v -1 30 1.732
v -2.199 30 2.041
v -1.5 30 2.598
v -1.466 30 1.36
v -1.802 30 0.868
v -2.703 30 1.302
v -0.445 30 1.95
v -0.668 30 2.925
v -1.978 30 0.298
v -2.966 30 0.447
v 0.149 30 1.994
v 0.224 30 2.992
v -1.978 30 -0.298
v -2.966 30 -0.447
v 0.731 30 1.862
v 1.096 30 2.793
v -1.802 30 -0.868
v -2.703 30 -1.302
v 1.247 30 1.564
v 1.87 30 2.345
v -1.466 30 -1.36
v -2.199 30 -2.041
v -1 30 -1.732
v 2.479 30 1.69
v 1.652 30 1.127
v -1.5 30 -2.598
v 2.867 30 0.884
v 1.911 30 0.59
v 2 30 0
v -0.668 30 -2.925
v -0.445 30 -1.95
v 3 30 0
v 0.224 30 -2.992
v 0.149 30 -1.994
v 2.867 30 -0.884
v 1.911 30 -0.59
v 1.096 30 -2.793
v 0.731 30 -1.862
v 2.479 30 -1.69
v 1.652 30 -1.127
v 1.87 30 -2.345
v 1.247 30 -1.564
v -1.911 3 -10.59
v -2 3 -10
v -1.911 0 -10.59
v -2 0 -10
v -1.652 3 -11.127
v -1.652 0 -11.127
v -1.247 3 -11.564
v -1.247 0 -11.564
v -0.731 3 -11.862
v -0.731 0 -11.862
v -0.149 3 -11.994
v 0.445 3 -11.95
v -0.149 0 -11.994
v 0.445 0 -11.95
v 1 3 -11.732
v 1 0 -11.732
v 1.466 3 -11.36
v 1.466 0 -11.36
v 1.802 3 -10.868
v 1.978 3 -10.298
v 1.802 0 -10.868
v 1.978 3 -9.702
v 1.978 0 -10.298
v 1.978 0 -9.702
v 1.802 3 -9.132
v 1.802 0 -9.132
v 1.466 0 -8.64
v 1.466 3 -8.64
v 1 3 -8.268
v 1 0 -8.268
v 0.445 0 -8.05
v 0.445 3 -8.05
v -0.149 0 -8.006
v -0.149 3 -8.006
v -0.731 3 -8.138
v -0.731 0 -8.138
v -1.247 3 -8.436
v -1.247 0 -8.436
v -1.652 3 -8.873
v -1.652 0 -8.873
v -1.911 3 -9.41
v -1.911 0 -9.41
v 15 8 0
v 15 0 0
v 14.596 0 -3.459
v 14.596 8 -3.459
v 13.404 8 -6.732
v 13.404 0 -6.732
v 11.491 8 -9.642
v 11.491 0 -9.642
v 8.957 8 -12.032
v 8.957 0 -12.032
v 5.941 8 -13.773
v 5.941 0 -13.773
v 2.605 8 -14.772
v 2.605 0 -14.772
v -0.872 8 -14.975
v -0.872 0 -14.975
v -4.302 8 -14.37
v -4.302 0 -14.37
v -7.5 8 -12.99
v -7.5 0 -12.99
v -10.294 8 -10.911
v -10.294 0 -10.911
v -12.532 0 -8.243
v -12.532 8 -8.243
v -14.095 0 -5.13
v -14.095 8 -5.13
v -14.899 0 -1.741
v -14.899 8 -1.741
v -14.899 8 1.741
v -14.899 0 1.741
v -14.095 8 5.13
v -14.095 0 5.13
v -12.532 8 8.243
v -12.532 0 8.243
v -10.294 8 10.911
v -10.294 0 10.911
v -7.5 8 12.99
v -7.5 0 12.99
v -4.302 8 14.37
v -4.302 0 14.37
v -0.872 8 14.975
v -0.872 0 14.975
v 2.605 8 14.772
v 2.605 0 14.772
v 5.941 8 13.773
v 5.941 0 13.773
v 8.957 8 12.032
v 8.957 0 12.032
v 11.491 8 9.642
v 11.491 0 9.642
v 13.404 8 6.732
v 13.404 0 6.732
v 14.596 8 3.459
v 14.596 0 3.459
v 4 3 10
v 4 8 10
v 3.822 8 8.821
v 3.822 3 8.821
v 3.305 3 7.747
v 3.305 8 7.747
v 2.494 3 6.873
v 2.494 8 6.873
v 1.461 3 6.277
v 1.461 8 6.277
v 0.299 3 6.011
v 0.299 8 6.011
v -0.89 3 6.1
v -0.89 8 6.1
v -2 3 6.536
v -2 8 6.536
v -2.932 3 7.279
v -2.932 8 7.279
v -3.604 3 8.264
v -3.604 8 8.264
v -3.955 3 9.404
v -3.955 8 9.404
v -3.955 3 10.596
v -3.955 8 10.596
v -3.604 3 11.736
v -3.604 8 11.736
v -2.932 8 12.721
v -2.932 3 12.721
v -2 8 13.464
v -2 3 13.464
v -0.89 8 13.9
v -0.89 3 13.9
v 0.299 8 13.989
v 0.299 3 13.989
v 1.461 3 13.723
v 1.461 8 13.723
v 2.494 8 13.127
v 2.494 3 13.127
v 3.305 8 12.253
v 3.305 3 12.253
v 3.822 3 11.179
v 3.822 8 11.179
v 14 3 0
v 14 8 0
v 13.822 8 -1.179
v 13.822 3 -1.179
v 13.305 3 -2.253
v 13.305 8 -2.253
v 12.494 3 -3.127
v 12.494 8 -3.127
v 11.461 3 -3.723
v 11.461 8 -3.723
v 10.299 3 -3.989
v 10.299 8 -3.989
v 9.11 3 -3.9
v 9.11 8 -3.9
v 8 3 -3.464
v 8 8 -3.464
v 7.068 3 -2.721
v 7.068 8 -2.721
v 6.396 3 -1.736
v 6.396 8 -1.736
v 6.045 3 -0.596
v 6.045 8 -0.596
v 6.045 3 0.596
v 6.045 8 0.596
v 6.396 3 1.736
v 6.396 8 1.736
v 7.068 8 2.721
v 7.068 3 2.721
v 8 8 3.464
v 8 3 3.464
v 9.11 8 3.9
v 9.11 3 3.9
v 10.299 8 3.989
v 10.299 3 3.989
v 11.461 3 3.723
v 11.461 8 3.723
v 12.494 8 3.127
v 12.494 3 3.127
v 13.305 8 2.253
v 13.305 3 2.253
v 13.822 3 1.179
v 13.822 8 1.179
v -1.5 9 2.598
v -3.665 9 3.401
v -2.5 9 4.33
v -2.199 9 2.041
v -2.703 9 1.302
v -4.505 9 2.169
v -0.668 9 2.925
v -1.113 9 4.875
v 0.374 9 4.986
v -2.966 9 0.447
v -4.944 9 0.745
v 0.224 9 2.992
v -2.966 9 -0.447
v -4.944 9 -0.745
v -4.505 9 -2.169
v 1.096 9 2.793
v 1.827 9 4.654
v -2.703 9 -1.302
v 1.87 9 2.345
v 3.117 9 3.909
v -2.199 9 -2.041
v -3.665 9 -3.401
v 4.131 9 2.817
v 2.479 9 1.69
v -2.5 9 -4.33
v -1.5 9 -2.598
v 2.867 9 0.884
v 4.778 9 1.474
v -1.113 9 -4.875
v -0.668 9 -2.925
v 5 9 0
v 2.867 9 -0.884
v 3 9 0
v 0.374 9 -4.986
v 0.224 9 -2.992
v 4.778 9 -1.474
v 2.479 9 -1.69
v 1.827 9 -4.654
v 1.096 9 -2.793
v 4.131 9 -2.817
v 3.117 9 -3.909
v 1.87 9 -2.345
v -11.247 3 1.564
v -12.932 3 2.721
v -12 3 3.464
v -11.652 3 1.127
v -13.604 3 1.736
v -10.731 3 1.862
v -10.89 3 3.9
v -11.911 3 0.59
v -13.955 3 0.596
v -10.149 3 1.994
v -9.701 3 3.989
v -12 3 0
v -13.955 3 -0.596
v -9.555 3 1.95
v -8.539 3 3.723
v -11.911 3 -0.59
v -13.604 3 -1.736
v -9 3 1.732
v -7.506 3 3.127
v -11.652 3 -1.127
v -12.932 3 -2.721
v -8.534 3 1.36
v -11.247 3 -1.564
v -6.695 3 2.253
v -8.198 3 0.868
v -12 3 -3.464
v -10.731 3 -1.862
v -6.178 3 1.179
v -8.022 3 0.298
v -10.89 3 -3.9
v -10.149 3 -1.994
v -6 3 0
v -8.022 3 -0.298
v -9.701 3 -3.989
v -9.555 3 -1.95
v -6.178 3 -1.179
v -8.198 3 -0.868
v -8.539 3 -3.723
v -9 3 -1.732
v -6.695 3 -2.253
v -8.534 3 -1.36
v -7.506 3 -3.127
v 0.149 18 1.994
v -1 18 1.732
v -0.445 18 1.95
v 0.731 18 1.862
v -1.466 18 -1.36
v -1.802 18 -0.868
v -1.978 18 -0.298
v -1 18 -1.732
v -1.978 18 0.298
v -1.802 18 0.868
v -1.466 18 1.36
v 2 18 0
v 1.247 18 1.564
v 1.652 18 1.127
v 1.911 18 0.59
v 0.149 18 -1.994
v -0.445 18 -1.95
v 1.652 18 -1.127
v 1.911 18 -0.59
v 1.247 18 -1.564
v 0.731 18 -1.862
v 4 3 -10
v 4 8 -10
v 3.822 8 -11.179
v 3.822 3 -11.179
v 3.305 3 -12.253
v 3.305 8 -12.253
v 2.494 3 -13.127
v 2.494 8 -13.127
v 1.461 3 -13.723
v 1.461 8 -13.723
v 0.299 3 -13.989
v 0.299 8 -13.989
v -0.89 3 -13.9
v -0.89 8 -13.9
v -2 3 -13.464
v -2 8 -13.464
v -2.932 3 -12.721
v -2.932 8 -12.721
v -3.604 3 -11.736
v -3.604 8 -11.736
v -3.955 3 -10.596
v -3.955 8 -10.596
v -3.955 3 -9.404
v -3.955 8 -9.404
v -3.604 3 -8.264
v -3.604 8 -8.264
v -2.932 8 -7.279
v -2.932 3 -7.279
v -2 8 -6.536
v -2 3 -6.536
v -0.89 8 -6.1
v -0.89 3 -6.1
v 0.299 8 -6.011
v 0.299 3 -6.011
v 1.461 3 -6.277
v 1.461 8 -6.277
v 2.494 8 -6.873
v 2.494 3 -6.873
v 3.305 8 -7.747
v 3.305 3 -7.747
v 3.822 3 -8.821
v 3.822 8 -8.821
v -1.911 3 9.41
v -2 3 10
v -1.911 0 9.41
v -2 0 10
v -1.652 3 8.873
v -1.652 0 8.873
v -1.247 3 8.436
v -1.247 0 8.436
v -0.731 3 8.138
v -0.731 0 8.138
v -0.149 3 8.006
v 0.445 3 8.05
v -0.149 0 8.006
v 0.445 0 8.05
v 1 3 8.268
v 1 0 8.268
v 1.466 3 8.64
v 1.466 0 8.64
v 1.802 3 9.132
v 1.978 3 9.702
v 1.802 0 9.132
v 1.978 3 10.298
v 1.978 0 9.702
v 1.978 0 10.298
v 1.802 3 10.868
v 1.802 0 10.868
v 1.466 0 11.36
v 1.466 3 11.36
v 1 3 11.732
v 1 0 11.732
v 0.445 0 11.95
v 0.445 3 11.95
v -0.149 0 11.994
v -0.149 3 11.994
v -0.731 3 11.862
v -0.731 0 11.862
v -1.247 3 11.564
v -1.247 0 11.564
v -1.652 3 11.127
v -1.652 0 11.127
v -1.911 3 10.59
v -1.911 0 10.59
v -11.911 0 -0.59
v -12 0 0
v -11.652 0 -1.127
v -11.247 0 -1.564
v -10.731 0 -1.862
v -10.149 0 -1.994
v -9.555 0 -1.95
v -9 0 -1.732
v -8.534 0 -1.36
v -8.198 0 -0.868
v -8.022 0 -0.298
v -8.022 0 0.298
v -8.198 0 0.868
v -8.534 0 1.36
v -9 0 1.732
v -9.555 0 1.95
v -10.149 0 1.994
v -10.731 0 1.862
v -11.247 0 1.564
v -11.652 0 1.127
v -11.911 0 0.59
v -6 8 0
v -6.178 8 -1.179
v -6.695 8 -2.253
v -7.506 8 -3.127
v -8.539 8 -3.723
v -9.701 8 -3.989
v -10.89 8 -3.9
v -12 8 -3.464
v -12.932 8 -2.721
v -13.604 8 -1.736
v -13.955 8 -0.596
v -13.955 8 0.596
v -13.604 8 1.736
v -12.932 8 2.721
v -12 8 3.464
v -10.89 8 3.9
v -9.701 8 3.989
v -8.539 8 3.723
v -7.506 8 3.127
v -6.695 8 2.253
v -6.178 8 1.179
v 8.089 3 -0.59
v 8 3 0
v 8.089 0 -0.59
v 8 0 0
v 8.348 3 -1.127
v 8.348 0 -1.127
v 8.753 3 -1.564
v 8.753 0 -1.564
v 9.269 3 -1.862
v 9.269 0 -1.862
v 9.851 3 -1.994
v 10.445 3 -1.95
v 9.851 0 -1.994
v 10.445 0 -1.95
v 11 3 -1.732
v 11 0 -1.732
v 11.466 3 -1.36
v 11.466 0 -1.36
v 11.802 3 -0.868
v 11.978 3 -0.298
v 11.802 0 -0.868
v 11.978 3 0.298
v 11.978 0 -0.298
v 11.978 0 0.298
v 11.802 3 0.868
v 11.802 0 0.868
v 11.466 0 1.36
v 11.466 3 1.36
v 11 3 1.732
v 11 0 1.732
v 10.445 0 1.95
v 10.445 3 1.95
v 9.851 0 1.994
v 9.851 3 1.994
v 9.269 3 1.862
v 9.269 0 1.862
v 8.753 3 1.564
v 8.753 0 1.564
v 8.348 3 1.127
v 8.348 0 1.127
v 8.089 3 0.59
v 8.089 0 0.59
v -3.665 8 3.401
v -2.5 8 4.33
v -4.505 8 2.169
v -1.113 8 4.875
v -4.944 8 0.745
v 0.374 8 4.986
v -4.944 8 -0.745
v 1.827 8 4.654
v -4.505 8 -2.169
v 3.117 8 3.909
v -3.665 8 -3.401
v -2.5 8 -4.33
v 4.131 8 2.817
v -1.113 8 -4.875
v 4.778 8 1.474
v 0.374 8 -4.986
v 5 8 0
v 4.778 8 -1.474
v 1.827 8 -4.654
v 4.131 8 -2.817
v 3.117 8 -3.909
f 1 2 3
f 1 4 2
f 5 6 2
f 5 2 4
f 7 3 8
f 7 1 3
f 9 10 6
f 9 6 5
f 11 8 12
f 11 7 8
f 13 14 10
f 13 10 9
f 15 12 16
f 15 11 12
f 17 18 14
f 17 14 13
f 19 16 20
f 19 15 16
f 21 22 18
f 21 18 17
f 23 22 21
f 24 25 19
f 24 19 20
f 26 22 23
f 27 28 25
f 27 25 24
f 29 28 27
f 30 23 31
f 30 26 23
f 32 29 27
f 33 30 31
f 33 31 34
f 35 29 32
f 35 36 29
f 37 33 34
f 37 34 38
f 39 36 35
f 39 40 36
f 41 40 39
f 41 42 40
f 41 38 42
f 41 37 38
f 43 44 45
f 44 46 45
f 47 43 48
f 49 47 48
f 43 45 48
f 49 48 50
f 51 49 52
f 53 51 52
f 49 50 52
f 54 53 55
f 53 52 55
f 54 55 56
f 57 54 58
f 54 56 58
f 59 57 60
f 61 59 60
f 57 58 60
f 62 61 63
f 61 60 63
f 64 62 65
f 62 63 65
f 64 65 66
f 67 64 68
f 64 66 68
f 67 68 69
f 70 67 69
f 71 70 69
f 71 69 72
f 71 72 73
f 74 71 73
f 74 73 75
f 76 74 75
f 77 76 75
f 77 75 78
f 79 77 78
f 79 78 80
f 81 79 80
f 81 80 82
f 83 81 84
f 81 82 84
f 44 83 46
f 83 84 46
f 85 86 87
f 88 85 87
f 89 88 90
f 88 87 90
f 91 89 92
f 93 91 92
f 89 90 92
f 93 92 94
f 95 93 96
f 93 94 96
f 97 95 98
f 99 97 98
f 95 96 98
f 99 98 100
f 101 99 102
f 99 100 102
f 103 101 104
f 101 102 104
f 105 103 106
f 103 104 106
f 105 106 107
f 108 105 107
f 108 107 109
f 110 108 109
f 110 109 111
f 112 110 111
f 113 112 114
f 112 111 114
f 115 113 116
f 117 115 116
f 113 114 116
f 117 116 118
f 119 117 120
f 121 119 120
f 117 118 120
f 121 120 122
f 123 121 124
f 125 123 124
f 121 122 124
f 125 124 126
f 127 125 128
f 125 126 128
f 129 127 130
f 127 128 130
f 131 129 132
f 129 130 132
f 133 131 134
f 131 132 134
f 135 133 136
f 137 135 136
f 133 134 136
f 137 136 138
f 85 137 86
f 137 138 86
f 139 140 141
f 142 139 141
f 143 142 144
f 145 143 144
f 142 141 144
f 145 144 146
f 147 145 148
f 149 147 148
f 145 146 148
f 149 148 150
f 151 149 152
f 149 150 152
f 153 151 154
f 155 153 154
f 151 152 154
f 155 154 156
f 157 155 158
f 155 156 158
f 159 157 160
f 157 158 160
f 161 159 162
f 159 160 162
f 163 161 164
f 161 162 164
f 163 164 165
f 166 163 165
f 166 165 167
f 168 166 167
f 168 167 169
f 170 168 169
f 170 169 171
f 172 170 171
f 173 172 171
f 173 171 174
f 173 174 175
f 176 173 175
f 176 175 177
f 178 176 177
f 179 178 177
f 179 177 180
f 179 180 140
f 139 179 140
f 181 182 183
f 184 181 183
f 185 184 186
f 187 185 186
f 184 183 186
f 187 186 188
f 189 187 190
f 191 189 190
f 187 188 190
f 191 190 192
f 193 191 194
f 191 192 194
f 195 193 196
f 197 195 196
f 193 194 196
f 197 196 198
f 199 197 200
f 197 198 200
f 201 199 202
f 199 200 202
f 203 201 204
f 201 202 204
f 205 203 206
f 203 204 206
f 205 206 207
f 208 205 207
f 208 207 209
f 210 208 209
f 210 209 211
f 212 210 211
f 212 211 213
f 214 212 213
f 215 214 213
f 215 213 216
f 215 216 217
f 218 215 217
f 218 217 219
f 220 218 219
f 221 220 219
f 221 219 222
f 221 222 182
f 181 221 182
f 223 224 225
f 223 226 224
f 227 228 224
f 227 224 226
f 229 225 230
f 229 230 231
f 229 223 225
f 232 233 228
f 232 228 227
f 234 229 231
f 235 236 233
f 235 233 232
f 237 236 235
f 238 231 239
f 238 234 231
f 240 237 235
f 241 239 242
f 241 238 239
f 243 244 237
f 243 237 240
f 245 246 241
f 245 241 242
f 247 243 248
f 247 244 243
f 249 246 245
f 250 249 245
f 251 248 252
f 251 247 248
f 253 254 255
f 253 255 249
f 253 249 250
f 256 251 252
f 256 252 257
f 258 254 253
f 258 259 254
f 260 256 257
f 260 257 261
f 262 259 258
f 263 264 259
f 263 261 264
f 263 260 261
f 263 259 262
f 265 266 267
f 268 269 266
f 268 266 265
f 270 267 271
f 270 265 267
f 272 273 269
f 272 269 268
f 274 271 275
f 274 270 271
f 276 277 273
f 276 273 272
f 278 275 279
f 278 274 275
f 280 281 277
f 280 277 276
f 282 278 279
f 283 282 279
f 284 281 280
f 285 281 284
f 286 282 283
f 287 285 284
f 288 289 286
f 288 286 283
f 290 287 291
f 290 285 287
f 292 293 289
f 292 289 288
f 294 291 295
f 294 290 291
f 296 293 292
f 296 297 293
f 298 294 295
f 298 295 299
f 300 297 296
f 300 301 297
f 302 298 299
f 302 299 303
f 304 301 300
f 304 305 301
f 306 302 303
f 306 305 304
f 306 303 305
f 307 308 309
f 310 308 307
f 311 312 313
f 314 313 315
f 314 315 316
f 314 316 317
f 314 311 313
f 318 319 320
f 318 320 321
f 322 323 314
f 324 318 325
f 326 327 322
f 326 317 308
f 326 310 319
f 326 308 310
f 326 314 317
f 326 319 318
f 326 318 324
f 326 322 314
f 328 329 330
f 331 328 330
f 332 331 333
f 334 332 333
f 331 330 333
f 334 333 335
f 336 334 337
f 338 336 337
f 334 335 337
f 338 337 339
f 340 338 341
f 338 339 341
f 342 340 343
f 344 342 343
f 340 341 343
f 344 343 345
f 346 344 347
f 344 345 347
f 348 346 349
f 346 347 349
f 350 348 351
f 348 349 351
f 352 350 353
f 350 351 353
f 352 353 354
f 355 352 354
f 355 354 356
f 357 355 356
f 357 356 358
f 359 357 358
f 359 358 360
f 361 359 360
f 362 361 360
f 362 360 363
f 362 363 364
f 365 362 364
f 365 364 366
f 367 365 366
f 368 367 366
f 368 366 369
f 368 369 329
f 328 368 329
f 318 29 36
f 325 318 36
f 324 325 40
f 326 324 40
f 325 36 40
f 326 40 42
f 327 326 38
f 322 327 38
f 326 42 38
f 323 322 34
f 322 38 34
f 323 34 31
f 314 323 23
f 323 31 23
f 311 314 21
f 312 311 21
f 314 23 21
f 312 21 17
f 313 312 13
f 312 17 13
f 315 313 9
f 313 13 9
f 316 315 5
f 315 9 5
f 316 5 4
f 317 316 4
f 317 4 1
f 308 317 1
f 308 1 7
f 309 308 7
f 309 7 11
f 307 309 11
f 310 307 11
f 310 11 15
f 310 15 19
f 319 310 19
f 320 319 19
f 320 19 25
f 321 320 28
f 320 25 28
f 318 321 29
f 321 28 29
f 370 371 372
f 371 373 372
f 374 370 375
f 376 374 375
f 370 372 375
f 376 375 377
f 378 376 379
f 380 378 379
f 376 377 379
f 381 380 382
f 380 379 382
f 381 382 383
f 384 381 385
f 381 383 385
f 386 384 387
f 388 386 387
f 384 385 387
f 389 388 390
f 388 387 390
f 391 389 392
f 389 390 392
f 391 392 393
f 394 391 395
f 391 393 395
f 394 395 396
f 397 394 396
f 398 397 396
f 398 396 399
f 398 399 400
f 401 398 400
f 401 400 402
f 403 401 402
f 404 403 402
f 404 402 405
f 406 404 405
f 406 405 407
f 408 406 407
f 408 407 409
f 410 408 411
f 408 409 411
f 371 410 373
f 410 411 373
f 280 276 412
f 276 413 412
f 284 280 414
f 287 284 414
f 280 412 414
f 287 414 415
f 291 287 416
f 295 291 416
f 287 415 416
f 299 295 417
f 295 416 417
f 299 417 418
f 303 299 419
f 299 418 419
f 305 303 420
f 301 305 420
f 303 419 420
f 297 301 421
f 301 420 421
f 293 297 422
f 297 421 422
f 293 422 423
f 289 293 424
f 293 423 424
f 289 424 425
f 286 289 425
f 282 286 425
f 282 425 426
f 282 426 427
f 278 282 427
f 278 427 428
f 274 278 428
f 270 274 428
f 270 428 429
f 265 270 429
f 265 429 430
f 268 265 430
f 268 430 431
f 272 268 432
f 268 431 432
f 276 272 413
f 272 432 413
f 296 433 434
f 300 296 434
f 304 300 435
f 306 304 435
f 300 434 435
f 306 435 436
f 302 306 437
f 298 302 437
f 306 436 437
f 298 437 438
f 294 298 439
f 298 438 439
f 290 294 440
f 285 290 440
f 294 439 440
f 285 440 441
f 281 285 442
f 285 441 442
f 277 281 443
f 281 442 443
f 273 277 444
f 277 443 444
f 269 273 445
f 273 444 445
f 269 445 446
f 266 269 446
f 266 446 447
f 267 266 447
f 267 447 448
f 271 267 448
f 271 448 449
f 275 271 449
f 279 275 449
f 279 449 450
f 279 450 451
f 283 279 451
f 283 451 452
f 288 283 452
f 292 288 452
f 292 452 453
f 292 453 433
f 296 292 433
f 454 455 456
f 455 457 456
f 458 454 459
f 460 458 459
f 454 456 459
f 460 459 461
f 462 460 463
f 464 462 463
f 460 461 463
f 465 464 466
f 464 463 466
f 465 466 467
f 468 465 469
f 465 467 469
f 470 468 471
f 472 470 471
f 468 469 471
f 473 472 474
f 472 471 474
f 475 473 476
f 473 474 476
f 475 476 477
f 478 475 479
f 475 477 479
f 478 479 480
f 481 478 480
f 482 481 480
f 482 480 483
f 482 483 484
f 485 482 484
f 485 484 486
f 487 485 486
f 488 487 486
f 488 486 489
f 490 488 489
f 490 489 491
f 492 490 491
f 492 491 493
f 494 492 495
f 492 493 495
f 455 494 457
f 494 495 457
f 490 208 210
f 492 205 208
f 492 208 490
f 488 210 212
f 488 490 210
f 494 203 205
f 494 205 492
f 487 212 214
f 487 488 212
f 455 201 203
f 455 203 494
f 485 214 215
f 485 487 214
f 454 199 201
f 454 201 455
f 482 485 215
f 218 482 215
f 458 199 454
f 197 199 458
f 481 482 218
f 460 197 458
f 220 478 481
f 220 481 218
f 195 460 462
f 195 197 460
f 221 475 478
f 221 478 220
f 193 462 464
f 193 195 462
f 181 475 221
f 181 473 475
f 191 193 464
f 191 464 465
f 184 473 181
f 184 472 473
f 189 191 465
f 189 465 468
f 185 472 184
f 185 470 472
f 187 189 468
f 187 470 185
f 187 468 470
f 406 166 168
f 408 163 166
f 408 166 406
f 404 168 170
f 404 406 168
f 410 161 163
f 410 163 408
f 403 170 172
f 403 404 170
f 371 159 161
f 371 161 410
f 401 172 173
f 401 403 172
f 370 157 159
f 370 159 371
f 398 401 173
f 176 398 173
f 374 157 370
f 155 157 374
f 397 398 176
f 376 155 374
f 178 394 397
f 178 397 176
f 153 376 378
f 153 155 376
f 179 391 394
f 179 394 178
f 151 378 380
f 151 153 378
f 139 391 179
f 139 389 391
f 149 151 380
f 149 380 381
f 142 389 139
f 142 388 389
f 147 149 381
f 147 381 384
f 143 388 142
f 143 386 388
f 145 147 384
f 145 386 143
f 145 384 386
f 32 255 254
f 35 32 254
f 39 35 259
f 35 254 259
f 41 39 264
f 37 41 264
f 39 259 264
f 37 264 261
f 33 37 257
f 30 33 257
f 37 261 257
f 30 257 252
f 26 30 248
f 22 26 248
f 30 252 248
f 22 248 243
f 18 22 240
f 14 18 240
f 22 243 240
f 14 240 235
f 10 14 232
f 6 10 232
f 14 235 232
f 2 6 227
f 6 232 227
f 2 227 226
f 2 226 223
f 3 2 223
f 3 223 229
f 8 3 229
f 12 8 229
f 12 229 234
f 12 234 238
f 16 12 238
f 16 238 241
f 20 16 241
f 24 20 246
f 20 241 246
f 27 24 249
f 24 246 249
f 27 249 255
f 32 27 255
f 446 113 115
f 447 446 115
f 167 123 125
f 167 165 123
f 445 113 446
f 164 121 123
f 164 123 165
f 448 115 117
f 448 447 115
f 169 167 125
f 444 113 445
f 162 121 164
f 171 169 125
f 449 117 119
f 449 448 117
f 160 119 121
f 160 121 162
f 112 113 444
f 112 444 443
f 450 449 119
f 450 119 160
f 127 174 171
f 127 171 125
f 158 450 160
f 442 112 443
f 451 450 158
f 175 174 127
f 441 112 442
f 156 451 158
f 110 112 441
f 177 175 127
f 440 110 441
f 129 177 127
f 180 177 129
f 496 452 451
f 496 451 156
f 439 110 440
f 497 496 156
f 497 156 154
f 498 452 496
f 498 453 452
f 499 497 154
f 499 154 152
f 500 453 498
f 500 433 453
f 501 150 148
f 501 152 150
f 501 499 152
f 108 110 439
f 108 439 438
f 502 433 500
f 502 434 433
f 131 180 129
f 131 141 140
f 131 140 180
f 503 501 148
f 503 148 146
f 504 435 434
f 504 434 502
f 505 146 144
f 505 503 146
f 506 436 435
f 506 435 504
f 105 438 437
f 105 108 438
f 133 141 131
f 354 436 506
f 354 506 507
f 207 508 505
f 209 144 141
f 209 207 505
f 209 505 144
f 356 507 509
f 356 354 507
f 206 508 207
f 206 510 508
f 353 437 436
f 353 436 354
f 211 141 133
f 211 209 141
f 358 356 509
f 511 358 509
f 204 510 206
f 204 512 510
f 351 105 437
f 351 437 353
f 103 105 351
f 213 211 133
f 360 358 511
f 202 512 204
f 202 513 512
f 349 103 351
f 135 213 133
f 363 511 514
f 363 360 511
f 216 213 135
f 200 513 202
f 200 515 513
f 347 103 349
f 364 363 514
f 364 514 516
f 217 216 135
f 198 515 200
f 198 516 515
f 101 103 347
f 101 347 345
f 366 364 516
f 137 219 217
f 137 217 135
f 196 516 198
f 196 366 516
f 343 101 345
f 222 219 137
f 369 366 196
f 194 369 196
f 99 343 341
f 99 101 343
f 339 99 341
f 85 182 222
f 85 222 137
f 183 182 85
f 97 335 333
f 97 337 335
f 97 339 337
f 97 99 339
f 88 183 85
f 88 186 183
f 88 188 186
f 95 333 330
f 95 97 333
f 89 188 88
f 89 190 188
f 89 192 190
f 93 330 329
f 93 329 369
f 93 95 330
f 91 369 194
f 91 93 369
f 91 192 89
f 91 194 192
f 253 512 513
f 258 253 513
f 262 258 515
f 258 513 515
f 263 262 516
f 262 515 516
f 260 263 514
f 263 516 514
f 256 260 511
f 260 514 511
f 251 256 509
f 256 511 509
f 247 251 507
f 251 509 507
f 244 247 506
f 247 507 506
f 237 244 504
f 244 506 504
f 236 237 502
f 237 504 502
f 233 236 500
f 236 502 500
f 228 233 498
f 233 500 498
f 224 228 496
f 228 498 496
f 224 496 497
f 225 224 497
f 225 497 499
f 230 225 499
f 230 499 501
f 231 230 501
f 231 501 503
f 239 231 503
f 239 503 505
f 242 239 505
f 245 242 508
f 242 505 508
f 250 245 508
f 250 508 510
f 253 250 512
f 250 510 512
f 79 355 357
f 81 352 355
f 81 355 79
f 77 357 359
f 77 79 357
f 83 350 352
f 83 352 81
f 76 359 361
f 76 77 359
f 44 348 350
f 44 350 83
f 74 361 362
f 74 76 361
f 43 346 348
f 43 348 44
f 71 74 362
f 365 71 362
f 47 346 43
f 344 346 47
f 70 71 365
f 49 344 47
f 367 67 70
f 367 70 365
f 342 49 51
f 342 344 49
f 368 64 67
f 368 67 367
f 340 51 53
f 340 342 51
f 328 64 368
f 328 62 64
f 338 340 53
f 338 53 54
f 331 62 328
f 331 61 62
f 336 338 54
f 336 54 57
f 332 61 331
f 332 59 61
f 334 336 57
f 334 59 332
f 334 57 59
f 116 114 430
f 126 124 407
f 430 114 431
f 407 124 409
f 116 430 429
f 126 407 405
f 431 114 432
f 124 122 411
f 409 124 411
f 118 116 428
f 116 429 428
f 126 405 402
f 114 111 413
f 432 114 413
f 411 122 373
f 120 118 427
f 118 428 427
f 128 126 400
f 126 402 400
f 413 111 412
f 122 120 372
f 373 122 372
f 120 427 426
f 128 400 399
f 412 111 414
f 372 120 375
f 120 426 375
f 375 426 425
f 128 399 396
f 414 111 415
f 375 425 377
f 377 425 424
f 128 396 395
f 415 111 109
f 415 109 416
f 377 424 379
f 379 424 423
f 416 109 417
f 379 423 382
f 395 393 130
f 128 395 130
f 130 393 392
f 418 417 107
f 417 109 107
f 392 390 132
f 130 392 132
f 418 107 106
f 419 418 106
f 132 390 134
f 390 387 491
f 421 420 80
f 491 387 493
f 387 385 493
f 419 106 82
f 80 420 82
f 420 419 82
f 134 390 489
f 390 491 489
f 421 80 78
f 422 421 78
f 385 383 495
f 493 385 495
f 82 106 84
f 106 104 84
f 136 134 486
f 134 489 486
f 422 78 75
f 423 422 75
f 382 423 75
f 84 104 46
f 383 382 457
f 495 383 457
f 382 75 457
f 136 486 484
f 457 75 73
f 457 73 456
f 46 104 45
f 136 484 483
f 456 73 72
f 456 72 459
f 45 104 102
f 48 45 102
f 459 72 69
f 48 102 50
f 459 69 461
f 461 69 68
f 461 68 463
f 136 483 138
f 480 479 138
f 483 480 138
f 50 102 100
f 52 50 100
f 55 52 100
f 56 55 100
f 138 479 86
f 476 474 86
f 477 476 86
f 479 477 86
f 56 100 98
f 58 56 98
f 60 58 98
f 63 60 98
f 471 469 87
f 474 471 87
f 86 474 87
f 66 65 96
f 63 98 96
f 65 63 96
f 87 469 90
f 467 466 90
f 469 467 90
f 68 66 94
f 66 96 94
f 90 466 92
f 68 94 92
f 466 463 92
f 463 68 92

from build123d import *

# Parameters (mm, degrees)
SKETCH1_R           = 15
BOSS_EXTRUDE1_DEPTH = 8
SKETCH2_R           = 5
BOSS_EXTRUDE2_DEPTH = 1
SKETCH3_R           = 3
BOSS_EXTRUDE3_DEPTH = 21
HOLE1_D             = 4
HOLE1_CBORE_D       = 8
HOLE1_CBORE_DEPTH   = 5
SKETCH8_R           = 2
CUT_EXTRUDE1_DEPTH  = 12


with BuildPart() as part:
    # Sketch1 → Boss-Extrude1 (new body)
    with BuildSketch(Plane(origin=(0, 0, 0), x_dir=(1, 0, 0), z_dir=(0, 1, 0))):
        Circle(SKETCH1_R)
    extrude(amount=BOSS_EXTRUDE1_DEPTH)

    # Sketch2 → Boss-Extrude2 (add)
    with BuildSketch(Plane(origin=(0, 8, 0), x_dir=(1, 0, 0), z_dir=(0, 1, 0))):
        Circle(SKETCH2_R)
    extrude(amount=BOSS_EXTRUDE2_DEPTH)

    # Sketch3 → Boss-Extrude3 (add)
    with BuildSketch(Plane(origin=(0, 9, 0), x_dir=(1, 0, 0), z_dir=(0, 1, 0))):
        Circle(SKETCH3_R)
    extrude(amount=BOSS_EXTRUDE3_DEPTH)

    # Hole1 (through all)
    with Locations(Plane(origin=(0, 8, 0), x_dir=(1, 0, 0), z_dir=(0, 1, 0))):
        with Locations((-10, 0), (0, 10), (10, 0), (0, -10)):
            CounterBoreHole(HOLE1_D / 2, HOLE1_CBORE_D / 2, HOLE1_CBORE_DEPTH)

    # Sketch8 → Cut-Extrude1 (cut)
    with BuildSketch(Plane(origin=(0, 30, 0), x_dir=(1, 0, 0), z_dir=(0, 1, 0))):
        Circle(SKETCH8_R)
    extrude(amount=-CUT_EXTRUDE1_DEPTH, mode=Mode.SUBTRACT)


solid = part.part
